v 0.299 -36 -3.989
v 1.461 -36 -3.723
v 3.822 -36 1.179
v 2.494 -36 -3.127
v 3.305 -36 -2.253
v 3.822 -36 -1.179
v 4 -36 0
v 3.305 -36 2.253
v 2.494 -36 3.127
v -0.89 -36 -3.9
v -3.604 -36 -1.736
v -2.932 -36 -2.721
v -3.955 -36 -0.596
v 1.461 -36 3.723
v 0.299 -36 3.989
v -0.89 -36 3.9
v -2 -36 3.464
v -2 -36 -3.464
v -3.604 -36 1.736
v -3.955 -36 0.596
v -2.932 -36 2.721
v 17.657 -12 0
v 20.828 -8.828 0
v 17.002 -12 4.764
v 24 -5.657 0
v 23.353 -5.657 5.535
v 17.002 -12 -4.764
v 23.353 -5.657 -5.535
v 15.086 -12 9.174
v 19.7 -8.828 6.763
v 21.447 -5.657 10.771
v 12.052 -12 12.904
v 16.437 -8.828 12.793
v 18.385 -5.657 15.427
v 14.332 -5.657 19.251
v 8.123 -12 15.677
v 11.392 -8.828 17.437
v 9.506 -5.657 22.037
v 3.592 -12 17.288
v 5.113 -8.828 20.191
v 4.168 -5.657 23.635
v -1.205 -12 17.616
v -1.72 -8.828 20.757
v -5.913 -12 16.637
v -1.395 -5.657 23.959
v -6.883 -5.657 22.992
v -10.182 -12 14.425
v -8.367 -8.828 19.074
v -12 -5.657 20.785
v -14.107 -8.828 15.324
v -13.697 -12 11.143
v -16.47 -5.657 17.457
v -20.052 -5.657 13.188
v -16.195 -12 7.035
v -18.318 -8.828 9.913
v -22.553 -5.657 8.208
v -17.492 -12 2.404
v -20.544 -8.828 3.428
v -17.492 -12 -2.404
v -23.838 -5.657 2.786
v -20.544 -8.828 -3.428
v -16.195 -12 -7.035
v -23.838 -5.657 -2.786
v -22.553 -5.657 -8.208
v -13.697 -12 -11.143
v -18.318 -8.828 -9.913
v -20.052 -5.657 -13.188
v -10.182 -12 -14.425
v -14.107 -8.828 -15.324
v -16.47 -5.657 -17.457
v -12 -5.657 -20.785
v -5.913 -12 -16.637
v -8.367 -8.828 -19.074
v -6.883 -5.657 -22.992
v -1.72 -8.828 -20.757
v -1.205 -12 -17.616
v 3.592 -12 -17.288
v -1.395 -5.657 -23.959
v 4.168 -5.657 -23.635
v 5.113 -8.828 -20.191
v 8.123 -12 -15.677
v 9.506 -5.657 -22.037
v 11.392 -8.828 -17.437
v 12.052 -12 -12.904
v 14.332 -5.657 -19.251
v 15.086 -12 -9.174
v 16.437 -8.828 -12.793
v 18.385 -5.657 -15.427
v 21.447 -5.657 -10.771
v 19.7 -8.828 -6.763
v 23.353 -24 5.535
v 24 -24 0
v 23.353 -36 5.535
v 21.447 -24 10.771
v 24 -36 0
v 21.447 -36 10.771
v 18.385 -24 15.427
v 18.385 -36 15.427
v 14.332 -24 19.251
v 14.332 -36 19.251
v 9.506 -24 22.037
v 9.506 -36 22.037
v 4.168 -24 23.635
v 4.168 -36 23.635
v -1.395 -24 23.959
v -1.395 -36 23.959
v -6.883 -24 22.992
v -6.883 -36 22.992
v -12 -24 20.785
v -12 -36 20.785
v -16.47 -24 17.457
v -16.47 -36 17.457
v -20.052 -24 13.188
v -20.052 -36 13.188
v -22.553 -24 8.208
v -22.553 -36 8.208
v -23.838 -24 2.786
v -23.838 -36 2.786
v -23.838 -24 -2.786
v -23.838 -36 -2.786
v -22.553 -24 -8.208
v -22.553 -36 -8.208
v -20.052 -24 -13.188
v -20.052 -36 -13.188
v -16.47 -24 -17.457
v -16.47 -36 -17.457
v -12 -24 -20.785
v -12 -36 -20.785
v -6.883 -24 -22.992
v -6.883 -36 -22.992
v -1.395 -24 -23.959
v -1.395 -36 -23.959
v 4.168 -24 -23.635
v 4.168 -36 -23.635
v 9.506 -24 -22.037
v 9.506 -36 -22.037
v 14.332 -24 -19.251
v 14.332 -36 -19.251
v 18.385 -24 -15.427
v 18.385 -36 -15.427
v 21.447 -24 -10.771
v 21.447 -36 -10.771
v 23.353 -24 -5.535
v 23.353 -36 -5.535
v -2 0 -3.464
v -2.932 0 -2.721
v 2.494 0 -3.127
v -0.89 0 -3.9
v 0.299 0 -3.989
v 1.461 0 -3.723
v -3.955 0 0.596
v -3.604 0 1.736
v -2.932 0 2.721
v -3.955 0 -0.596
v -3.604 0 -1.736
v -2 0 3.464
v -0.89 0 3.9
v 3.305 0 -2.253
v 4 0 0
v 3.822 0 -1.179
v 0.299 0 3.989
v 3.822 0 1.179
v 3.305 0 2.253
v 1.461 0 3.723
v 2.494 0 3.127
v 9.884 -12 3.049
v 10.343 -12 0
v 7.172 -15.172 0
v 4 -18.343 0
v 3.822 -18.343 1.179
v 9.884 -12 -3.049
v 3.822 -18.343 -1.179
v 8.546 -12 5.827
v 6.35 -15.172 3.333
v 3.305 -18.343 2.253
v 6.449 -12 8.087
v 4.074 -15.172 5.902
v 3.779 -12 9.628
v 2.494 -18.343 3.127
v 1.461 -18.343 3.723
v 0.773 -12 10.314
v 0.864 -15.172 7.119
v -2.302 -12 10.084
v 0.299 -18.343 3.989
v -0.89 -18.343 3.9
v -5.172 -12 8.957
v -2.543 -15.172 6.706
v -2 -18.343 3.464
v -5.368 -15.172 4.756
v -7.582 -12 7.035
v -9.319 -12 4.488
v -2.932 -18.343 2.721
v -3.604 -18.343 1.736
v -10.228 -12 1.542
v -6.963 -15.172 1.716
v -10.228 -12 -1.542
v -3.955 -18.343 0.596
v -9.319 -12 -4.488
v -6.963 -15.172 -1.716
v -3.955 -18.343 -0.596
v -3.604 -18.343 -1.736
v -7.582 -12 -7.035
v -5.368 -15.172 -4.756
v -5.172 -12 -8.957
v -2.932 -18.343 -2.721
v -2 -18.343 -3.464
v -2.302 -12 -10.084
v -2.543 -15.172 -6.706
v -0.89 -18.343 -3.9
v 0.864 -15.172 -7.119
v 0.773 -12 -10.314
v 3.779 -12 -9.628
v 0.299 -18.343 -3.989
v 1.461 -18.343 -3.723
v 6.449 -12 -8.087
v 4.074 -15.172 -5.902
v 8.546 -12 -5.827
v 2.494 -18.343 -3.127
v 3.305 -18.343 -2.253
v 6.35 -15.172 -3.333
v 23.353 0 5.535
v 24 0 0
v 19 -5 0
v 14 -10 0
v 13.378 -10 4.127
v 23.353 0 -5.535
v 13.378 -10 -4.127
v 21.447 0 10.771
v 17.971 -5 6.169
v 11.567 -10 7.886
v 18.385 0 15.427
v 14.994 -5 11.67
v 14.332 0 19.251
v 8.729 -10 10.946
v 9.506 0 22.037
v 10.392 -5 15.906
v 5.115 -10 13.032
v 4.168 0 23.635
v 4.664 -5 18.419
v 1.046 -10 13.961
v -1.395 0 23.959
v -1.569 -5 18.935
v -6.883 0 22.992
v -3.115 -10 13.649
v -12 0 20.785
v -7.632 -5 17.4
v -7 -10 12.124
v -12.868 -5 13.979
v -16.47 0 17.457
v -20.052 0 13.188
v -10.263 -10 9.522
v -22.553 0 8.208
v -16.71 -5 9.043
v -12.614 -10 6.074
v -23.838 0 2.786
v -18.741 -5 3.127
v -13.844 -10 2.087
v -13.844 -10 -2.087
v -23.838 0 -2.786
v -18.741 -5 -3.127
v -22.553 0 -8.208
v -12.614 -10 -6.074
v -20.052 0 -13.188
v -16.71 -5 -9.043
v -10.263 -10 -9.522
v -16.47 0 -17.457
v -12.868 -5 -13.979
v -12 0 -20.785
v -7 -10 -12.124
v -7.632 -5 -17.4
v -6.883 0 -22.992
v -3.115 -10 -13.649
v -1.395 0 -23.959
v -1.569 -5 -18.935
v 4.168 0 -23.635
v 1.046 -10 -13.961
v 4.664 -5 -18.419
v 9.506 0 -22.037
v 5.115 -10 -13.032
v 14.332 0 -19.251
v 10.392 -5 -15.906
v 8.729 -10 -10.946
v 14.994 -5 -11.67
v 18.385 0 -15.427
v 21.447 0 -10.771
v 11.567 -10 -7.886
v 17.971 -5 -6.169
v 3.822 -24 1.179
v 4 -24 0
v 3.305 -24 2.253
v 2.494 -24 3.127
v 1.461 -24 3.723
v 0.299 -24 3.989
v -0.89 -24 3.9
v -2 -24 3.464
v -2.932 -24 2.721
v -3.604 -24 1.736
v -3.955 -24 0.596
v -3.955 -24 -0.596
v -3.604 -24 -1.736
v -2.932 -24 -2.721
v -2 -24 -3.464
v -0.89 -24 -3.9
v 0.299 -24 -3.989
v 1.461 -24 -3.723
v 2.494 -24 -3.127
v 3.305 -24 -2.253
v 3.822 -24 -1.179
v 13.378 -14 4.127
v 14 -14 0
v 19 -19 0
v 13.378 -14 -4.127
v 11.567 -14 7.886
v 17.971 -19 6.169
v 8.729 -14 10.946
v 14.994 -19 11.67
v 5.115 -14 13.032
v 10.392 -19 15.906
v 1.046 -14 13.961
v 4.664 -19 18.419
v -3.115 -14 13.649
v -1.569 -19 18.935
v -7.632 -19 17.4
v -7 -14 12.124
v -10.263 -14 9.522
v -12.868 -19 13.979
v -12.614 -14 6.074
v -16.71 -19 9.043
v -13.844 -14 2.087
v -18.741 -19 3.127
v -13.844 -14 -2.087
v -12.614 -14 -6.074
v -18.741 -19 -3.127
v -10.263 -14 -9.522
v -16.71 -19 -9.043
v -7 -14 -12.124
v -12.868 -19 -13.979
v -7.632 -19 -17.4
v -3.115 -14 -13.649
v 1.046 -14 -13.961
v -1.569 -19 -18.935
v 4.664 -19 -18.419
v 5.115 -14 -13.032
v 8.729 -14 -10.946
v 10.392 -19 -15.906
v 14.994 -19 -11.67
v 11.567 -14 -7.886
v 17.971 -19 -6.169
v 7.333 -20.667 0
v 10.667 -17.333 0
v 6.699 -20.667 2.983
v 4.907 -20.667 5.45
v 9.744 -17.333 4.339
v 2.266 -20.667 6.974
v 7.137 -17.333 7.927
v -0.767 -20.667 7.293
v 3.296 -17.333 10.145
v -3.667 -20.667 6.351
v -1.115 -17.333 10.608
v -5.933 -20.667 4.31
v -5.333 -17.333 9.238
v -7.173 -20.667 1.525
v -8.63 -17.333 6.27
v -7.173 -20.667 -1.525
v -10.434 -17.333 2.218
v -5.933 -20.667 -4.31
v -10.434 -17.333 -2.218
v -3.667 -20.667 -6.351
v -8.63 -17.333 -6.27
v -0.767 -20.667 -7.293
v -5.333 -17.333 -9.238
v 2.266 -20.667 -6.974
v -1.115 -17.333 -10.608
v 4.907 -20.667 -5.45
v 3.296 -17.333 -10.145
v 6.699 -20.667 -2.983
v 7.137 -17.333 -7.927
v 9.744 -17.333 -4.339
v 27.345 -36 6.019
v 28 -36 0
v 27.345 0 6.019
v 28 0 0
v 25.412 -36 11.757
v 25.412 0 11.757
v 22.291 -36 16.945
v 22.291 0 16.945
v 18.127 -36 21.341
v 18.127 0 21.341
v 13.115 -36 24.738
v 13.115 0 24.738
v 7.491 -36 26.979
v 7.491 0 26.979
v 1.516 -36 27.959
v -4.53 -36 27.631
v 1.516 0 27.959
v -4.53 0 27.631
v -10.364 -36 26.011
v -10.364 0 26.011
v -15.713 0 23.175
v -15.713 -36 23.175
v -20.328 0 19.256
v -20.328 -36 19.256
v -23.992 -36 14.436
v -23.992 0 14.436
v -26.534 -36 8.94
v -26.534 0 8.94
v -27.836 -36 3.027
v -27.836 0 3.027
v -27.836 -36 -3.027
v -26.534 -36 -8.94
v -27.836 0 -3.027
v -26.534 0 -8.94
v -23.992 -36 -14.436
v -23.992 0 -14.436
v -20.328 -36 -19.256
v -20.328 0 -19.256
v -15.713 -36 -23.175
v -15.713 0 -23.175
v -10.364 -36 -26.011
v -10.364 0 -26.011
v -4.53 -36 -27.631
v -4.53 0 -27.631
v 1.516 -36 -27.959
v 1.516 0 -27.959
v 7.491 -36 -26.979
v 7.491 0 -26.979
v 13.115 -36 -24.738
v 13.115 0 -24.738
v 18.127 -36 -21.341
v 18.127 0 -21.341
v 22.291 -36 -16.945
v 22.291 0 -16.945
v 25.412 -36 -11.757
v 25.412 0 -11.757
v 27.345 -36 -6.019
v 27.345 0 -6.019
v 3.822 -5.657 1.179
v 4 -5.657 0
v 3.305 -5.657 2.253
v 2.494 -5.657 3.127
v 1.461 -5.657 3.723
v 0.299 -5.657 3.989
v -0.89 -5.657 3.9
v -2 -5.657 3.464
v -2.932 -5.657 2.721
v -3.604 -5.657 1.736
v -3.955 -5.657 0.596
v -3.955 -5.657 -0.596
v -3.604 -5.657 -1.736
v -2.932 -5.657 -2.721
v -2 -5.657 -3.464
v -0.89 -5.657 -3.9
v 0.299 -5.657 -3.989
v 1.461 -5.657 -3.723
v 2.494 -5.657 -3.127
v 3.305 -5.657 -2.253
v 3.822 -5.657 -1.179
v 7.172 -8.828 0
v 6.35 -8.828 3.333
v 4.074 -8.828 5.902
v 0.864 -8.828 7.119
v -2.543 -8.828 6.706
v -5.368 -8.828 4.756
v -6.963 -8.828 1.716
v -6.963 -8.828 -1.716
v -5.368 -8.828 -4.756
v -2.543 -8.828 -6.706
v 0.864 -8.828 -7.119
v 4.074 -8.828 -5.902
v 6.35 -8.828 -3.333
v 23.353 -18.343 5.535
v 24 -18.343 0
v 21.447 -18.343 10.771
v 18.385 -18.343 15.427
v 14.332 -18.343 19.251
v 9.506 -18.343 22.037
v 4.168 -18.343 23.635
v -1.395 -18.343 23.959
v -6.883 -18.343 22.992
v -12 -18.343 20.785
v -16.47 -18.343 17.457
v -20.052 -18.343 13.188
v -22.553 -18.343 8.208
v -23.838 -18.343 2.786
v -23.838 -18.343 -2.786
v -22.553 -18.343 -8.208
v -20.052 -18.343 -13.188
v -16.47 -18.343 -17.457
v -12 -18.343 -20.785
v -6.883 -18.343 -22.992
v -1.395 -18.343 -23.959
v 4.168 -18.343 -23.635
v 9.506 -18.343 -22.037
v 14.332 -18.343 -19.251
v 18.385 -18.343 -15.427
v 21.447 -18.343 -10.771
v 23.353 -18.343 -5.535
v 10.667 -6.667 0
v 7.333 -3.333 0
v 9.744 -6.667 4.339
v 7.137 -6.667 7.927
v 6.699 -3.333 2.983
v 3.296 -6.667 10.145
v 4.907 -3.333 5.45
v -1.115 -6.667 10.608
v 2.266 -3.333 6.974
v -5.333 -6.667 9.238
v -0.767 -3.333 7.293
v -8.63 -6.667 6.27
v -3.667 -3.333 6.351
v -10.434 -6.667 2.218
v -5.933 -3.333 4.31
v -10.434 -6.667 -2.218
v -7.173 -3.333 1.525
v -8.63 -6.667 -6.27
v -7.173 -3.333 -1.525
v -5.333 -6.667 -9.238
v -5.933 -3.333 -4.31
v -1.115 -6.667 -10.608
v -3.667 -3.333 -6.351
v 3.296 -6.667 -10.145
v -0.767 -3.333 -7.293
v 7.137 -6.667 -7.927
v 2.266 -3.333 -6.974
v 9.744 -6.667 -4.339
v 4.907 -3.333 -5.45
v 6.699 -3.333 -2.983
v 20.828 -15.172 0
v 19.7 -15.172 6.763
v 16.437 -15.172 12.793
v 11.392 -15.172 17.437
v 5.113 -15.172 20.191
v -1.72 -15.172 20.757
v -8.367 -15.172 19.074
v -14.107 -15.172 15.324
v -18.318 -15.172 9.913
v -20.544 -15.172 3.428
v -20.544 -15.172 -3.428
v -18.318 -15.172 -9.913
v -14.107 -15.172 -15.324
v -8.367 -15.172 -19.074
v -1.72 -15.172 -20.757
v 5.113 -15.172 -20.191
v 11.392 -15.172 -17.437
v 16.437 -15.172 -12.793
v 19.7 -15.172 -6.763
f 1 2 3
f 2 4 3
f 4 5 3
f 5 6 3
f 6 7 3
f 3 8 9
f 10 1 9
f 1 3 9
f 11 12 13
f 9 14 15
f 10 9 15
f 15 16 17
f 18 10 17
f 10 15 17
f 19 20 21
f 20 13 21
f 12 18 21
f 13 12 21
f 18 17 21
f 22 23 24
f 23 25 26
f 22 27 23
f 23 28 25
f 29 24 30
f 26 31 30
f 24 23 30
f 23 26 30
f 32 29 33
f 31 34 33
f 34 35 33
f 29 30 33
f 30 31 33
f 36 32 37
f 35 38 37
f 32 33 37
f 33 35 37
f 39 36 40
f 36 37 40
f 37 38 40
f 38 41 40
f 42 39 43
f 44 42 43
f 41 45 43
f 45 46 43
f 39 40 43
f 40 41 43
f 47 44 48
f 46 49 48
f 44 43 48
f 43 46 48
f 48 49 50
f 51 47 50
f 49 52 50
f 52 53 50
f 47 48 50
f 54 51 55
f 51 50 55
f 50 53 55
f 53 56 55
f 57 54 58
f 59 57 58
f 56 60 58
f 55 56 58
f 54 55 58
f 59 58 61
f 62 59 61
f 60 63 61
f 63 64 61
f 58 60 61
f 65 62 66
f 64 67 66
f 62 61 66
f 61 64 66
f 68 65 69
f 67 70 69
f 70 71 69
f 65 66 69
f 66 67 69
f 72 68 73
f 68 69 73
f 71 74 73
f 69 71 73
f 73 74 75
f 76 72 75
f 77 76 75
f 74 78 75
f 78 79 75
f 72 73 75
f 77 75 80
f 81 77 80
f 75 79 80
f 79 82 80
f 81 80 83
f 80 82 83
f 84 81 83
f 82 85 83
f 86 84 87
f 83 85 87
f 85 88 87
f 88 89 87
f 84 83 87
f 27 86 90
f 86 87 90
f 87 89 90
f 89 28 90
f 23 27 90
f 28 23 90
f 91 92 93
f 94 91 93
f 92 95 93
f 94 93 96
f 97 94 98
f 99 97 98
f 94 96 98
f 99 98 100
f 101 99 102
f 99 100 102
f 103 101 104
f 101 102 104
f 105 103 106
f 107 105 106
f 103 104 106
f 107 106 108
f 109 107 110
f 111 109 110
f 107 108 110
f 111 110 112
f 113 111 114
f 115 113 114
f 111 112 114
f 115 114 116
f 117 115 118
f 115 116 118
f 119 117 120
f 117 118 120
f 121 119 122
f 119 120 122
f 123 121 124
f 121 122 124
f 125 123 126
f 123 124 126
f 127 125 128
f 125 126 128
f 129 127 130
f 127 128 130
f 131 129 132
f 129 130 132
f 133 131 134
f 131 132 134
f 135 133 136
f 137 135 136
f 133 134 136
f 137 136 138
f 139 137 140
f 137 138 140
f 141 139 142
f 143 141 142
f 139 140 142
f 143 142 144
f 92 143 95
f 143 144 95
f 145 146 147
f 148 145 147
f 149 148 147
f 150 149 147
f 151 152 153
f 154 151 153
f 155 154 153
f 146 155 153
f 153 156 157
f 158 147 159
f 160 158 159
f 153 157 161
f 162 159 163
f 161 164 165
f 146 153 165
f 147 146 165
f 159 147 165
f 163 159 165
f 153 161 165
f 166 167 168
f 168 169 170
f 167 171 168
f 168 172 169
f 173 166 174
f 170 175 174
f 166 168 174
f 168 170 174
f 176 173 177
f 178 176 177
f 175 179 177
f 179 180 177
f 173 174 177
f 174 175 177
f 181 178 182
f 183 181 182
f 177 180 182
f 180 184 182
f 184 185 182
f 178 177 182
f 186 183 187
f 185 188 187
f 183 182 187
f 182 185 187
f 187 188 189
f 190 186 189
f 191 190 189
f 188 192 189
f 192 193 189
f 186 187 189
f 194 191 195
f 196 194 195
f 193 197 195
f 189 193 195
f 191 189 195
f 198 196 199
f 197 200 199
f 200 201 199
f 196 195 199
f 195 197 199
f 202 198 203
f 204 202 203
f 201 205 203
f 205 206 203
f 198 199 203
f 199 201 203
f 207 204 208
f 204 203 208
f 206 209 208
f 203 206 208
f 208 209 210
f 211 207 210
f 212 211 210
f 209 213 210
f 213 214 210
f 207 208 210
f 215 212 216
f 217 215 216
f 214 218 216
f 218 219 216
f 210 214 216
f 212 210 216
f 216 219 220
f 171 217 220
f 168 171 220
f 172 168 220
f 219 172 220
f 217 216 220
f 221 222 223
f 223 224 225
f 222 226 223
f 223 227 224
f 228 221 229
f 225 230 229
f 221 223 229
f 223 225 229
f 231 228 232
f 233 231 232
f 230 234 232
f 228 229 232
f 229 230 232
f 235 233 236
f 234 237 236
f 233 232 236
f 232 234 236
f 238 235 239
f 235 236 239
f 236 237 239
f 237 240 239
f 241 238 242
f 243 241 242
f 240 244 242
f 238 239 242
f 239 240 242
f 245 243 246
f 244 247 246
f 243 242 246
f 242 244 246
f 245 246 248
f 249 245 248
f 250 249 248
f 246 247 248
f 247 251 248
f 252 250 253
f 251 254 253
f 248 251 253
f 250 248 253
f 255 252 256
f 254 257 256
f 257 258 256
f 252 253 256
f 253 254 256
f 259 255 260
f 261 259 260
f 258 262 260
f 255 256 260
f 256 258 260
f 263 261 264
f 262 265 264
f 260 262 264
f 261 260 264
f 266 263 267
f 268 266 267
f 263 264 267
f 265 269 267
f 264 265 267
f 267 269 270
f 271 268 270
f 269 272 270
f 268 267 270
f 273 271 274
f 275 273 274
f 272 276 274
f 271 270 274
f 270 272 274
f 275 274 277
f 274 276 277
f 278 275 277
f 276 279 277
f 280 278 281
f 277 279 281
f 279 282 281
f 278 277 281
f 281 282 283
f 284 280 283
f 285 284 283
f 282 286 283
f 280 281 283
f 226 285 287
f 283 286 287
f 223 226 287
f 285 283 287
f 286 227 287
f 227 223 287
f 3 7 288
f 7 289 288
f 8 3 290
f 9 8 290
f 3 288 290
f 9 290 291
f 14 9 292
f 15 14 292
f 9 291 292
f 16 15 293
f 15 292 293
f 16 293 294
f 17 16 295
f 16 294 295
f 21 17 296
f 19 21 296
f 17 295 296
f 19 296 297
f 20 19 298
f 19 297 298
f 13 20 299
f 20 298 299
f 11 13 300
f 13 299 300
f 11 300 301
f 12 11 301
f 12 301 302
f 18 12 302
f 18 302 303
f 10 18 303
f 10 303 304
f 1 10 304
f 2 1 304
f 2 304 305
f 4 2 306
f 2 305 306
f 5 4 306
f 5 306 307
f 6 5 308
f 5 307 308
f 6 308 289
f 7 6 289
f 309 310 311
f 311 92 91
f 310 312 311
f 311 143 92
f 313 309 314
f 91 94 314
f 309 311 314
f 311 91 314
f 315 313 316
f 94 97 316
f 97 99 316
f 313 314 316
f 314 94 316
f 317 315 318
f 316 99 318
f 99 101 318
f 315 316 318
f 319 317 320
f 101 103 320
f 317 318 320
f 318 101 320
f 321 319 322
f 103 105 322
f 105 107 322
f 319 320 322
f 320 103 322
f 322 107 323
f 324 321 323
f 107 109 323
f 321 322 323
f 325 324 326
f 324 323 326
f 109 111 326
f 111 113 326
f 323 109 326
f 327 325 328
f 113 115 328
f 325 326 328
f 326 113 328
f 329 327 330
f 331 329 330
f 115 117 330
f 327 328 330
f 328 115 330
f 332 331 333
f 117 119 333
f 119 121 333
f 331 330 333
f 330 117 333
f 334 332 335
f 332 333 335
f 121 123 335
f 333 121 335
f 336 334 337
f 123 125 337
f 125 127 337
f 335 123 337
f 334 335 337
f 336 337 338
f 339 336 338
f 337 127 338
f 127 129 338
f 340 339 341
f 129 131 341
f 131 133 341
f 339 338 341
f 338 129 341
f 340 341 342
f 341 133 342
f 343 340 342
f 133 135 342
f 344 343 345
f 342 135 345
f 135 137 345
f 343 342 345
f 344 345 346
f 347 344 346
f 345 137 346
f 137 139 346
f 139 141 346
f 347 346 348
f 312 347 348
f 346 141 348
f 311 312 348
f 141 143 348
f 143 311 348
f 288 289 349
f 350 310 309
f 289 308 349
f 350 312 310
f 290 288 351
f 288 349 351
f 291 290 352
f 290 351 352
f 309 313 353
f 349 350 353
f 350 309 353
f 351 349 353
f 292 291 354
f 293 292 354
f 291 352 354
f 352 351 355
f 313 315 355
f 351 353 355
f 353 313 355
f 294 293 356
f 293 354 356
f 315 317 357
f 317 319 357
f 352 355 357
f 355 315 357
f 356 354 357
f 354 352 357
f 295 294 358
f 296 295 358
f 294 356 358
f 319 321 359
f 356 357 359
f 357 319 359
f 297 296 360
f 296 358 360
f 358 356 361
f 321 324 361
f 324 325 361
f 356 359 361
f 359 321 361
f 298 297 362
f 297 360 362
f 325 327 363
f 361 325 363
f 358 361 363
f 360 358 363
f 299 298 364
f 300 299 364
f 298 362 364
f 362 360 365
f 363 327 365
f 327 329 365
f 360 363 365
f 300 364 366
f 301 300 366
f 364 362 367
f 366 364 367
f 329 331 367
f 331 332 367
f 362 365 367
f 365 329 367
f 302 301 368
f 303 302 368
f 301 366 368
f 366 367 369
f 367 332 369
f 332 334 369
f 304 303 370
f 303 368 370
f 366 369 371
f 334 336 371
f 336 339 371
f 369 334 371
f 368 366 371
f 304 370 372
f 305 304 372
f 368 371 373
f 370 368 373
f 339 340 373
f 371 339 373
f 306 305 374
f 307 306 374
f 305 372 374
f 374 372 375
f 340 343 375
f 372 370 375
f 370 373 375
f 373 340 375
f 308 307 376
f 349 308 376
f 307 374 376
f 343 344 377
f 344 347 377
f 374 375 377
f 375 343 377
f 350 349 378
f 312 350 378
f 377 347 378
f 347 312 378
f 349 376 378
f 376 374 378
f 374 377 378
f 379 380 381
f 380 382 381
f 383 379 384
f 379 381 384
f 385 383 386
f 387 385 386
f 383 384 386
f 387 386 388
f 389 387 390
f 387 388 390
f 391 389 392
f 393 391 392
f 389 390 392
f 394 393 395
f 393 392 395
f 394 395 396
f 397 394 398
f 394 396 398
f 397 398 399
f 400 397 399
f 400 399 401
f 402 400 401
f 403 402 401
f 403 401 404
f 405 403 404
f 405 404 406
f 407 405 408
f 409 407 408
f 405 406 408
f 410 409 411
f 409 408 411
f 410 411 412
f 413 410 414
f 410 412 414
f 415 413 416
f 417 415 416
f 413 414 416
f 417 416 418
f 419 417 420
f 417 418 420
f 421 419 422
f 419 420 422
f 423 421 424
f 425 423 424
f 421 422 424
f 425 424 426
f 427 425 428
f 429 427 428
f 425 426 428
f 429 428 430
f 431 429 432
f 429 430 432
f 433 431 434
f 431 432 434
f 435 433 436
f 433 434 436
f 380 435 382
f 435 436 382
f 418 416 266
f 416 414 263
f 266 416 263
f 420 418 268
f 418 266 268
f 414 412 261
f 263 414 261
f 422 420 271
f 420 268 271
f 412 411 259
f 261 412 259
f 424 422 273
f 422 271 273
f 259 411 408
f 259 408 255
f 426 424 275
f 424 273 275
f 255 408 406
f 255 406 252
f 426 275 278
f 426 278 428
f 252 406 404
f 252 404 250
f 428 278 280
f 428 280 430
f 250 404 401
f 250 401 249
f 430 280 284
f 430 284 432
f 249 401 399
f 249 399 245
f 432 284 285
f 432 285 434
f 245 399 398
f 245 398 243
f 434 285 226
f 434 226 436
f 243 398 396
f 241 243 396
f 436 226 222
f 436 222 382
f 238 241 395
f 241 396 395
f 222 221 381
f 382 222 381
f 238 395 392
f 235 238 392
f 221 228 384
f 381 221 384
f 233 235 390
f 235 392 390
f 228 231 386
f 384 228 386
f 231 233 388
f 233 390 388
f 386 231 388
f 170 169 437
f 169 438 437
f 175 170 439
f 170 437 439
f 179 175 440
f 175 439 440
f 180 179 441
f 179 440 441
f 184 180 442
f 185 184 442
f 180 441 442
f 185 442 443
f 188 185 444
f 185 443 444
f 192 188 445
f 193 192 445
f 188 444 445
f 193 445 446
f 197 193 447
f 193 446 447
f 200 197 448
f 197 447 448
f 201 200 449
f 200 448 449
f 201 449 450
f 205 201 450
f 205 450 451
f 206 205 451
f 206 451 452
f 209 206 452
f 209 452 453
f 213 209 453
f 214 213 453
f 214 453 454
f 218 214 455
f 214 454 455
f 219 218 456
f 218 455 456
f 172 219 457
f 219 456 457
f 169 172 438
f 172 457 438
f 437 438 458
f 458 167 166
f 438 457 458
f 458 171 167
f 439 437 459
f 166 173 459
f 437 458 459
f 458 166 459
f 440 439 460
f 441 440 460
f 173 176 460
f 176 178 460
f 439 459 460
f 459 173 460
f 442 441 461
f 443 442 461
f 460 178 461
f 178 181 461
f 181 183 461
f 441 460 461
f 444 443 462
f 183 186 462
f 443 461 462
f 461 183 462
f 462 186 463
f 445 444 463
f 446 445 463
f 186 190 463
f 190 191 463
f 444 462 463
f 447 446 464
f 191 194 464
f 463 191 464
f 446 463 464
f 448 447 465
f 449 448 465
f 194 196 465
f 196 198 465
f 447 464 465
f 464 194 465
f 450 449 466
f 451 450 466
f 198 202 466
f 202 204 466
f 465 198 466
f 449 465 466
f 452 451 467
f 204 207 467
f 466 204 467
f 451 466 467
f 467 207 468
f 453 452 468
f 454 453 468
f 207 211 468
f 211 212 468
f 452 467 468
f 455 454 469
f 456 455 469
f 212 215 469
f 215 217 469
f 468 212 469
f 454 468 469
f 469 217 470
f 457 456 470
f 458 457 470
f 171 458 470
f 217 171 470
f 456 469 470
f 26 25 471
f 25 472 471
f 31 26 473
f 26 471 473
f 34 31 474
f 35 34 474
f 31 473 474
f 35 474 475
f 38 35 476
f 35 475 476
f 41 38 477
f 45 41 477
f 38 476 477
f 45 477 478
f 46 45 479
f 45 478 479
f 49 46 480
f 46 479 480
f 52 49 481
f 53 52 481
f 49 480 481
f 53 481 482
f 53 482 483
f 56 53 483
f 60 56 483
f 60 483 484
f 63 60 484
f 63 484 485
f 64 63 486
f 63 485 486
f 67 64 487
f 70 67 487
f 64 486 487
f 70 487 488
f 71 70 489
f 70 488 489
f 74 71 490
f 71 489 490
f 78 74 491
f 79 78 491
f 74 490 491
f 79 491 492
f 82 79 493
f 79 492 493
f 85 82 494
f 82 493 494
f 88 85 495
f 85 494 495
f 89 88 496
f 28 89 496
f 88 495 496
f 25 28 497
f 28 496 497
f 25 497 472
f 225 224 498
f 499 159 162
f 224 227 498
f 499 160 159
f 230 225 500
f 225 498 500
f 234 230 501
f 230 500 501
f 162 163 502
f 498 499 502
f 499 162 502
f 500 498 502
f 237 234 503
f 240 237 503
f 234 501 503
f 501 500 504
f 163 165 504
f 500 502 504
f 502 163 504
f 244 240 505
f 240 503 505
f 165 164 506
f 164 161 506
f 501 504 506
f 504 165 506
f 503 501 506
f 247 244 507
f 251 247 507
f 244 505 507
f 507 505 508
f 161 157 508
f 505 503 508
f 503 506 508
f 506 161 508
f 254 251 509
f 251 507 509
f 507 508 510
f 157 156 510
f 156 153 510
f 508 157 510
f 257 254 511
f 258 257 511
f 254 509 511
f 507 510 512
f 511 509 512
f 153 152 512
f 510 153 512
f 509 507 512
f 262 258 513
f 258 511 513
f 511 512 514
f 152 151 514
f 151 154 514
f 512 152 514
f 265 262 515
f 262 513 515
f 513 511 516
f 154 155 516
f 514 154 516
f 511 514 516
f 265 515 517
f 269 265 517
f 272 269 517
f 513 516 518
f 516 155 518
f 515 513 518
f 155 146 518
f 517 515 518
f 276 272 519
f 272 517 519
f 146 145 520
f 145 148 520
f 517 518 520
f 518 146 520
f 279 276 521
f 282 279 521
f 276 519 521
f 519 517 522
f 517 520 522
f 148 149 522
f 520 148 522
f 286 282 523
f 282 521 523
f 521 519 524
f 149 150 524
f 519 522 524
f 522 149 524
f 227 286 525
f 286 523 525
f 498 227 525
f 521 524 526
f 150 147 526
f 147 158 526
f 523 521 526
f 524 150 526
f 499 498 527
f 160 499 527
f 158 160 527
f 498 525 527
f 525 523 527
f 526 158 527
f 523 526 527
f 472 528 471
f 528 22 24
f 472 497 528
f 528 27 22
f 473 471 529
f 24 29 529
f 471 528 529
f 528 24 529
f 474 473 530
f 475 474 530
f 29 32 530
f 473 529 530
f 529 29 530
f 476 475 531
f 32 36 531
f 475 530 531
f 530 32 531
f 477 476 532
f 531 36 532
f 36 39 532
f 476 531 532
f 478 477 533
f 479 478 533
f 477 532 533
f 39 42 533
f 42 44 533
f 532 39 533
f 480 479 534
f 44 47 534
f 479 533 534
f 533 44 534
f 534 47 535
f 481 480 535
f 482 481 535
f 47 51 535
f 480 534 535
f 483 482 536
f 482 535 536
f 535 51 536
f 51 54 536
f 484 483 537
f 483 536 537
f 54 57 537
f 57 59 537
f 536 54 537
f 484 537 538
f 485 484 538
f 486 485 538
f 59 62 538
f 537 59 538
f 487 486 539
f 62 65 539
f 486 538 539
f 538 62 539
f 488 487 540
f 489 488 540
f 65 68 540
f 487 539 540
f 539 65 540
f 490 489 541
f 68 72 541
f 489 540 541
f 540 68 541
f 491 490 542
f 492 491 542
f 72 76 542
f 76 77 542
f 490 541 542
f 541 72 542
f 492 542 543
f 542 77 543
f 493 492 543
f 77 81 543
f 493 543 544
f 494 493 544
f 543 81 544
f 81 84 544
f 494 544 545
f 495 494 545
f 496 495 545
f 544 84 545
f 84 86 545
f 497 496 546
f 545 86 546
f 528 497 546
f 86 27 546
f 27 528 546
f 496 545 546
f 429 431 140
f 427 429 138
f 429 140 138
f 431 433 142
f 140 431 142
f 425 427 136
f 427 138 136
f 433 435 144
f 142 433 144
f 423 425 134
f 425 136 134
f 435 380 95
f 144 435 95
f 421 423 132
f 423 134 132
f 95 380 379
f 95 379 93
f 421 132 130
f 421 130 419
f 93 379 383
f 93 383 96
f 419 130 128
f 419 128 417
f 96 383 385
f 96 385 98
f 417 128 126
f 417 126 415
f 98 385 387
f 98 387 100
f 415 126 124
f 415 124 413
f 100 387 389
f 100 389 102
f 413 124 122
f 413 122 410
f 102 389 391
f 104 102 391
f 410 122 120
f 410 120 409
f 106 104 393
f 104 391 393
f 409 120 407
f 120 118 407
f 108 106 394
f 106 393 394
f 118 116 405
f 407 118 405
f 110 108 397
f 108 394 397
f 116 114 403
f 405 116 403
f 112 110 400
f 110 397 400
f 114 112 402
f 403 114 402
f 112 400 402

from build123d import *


with BuildPart() as f1:
    # F0 (on Top) → F1 (revolve)
    with BuildSketch(Plane.XY):
        Polygon((4, -36), (4, -24), (14, -14), (24, -24), (24, -36), (28, -36), (28, 0), (24, 0), (14, -10), (4, 0), (0, 0), (0, -36), align=None)
        Polygon((10.343146, -12), (4, -18.343146), (4, -5.656854), align=None, mode=Mode.SUBTRACT)
        Polygon((24, -18.343146), (17.656854, -12), (24, -5.656854), align=None, mode=Mode.SUBTRACT)
    revolve(axis=Axis((0, -18, 0), (0, -1, 0)))


solid = f1.part
